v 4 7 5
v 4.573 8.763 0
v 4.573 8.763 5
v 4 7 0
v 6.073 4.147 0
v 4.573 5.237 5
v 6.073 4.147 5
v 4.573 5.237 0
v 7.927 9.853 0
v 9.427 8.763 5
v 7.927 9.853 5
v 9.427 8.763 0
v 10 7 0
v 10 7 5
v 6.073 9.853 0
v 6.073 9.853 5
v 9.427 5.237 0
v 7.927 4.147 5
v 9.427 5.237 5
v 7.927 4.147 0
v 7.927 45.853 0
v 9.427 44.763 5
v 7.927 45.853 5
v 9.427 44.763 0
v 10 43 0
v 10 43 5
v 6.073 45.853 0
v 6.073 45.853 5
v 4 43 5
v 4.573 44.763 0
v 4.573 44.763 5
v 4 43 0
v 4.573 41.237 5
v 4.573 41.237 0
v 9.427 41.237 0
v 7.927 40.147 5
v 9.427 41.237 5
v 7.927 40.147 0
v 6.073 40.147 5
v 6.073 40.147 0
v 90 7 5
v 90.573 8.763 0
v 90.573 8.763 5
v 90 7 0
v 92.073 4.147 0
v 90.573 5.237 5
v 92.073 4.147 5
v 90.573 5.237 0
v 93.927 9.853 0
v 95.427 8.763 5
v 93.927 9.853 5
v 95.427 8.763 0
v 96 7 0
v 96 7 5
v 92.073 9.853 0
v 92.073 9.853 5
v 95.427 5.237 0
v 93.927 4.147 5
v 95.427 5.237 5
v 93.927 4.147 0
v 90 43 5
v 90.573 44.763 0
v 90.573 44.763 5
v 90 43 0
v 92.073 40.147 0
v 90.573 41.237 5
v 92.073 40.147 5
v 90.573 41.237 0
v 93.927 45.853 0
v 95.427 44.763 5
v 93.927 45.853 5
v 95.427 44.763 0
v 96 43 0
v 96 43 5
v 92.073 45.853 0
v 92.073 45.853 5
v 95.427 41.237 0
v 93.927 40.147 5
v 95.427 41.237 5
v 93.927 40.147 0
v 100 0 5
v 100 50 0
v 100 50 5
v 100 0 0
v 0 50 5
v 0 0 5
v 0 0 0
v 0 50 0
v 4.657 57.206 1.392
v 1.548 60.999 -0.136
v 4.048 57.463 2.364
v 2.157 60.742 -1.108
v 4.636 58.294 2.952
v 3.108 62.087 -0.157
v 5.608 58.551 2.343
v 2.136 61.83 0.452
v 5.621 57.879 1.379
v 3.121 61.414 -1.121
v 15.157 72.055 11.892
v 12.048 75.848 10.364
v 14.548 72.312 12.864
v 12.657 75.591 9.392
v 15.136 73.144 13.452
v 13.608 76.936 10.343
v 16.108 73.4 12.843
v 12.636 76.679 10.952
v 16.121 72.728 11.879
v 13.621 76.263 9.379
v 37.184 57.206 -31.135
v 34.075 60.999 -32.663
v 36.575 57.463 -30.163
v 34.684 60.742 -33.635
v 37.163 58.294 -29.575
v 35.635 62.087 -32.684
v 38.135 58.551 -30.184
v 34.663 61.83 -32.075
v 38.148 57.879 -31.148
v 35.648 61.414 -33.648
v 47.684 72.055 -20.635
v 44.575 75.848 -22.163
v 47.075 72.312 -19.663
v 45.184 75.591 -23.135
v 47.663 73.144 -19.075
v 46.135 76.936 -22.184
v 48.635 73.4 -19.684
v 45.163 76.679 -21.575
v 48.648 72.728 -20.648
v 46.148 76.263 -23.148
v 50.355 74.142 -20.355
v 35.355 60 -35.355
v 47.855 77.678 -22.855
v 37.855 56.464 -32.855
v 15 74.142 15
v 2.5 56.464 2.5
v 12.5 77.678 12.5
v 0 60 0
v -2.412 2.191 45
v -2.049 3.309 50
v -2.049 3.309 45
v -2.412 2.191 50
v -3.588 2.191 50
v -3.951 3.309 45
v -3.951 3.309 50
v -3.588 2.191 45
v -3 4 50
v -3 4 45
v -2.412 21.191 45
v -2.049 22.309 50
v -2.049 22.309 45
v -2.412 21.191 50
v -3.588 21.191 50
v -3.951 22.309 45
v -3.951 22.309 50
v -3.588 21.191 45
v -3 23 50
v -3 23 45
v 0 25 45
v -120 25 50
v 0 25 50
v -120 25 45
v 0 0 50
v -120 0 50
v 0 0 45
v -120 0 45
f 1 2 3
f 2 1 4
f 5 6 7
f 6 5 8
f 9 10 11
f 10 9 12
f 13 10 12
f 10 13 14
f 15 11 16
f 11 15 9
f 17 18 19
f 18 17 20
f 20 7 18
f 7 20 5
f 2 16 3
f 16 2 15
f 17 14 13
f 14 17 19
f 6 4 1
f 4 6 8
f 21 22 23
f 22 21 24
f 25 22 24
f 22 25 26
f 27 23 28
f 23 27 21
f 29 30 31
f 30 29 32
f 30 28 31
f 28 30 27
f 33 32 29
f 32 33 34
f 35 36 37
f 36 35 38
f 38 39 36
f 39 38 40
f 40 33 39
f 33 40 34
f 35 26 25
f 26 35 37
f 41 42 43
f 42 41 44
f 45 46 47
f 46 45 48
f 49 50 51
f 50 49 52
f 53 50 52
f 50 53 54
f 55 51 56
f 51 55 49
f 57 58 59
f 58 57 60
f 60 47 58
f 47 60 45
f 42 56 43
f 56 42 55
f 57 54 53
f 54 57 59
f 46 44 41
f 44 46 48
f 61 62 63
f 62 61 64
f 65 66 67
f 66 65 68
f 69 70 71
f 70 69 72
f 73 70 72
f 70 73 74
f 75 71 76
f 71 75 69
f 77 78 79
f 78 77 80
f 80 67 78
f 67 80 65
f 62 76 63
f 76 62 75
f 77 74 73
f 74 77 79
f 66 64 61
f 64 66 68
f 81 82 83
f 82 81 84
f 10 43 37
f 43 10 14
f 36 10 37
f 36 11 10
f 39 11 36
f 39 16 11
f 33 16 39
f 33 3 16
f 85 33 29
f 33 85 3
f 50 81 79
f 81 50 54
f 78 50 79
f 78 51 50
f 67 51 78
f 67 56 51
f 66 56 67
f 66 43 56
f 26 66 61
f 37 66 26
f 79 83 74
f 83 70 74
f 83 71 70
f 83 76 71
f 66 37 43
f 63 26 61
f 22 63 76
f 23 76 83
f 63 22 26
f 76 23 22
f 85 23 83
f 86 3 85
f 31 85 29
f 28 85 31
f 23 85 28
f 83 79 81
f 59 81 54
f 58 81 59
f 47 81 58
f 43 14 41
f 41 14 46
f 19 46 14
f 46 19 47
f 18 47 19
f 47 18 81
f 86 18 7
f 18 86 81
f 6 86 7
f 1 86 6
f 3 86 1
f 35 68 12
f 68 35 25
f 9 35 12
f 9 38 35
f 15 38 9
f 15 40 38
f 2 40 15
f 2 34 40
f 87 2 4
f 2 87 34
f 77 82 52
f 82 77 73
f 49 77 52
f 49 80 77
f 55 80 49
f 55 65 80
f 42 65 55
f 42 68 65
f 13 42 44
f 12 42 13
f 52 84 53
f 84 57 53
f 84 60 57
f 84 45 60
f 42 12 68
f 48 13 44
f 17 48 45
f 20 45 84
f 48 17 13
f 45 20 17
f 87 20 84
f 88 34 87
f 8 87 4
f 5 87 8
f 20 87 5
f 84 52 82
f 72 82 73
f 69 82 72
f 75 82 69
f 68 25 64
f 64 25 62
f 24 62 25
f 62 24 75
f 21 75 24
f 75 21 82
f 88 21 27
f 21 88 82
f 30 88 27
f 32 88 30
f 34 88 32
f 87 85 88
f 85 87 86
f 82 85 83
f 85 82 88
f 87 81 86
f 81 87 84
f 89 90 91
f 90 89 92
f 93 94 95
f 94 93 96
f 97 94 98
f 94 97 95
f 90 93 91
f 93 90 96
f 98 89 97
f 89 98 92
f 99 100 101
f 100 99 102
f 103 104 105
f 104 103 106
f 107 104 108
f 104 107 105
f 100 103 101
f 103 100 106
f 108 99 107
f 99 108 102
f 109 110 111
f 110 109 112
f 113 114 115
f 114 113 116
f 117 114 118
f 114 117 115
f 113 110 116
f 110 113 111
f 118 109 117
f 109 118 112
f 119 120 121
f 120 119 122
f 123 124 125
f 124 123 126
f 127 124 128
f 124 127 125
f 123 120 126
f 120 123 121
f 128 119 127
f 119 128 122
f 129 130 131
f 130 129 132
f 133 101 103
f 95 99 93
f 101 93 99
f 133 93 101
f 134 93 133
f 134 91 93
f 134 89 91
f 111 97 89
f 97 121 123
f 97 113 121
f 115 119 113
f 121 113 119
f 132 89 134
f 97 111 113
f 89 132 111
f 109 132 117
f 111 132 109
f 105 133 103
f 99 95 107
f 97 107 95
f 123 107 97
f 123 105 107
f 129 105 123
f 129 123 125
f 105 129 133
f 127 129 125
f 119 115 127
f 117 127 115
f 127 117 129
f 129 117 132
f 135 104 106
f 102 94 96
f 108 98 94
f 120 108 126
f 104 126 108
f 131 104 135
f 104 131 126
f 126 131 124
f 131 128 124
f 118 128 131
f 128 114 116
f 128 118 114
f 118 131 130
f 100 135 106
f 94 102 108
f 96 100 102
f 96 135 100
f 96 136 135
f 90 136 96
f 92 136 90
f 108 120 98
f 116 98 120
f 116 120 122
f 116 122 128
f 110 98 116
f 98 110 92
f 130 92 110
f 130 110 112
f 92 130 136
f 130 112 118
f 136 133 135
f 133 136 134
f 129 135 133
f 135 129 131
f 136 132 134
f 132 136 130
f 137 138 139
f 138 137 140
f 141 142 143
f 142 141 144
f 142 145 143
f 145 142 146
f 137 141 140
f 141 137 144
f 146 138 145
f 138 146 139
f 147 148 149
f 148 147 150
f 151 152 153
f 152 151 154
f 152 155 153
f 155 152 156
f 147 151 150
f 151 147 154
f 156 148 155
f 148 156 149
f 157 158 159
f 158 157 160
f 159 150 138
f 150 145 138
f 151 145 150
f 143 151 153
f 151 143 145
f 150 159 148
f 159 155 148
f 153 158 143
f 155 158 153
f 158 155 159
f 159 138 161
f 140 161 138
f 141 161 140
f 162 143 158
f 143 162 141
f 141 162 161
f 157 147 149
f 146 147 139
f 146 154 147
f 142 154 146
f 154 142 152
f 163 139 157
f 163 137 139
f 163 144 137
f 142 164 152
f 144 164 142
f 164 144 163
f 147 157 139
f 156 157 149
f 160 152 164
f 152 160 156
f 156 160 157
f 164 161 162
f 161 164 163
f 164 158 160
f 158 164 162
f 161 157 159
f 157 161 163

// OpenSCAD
/*
OpenSCAD test project
//*/
//
//// Comment
//
//adjustment = 0.7;
//adjustment_factor = 2;
//
//function adjust(x) = (x + adjustment) * adjustment_factor;
//
//cube(size = 10, center = true);
//
//translate( [ 5, 0, 0] )
//rotate ( [0, 0, 45] ) 
//translate( [20, 0, 0] ) 
//cube(10, true);

// dimensions in millimeter [ width, depth, height ]

module hole_plate( size, hole_dm, hole_margin, hole_count = [ 2, 2] ) {

    abs_margin = hole_margin + hole_dm / 2;
    
    x_hole_dist = 
        (size.x - 2 * abs_margin) 
        / (hole_count.x - 1) ;
    
    y_hole_dist = 
        (size.y - 2 * abs_margin)
        / (hole_count.y - 1) ;
    x_values = [abs_margin : x_hole_dist : size.x - abs_margin];
    y_values = [abs_margin : y_hole_dist : size.y - abs_margin];
    
    // holes
    
    difference() {
        
    cube( size);
    
    for (x = x_values, y = y_values)
        translate( [x, y, -1] )
    color( "red" )
    cylinder( d = hole_dm, h = size.z + 2);
    
    }

}


plate = [100, 50, 5];

hole_plate( plate, 6, 4);

translate( [ 0, 60, 0] )
rotate( [ 45, 45, 0 ] )
hole_plate( [50, 25, 5], 2, 1);

translate( [ 0, 0, 45] )
rotate( [ 0, 0, 90 ] )
hole_plate( [25, 120, 5], 2, 2, [2, 1] );
